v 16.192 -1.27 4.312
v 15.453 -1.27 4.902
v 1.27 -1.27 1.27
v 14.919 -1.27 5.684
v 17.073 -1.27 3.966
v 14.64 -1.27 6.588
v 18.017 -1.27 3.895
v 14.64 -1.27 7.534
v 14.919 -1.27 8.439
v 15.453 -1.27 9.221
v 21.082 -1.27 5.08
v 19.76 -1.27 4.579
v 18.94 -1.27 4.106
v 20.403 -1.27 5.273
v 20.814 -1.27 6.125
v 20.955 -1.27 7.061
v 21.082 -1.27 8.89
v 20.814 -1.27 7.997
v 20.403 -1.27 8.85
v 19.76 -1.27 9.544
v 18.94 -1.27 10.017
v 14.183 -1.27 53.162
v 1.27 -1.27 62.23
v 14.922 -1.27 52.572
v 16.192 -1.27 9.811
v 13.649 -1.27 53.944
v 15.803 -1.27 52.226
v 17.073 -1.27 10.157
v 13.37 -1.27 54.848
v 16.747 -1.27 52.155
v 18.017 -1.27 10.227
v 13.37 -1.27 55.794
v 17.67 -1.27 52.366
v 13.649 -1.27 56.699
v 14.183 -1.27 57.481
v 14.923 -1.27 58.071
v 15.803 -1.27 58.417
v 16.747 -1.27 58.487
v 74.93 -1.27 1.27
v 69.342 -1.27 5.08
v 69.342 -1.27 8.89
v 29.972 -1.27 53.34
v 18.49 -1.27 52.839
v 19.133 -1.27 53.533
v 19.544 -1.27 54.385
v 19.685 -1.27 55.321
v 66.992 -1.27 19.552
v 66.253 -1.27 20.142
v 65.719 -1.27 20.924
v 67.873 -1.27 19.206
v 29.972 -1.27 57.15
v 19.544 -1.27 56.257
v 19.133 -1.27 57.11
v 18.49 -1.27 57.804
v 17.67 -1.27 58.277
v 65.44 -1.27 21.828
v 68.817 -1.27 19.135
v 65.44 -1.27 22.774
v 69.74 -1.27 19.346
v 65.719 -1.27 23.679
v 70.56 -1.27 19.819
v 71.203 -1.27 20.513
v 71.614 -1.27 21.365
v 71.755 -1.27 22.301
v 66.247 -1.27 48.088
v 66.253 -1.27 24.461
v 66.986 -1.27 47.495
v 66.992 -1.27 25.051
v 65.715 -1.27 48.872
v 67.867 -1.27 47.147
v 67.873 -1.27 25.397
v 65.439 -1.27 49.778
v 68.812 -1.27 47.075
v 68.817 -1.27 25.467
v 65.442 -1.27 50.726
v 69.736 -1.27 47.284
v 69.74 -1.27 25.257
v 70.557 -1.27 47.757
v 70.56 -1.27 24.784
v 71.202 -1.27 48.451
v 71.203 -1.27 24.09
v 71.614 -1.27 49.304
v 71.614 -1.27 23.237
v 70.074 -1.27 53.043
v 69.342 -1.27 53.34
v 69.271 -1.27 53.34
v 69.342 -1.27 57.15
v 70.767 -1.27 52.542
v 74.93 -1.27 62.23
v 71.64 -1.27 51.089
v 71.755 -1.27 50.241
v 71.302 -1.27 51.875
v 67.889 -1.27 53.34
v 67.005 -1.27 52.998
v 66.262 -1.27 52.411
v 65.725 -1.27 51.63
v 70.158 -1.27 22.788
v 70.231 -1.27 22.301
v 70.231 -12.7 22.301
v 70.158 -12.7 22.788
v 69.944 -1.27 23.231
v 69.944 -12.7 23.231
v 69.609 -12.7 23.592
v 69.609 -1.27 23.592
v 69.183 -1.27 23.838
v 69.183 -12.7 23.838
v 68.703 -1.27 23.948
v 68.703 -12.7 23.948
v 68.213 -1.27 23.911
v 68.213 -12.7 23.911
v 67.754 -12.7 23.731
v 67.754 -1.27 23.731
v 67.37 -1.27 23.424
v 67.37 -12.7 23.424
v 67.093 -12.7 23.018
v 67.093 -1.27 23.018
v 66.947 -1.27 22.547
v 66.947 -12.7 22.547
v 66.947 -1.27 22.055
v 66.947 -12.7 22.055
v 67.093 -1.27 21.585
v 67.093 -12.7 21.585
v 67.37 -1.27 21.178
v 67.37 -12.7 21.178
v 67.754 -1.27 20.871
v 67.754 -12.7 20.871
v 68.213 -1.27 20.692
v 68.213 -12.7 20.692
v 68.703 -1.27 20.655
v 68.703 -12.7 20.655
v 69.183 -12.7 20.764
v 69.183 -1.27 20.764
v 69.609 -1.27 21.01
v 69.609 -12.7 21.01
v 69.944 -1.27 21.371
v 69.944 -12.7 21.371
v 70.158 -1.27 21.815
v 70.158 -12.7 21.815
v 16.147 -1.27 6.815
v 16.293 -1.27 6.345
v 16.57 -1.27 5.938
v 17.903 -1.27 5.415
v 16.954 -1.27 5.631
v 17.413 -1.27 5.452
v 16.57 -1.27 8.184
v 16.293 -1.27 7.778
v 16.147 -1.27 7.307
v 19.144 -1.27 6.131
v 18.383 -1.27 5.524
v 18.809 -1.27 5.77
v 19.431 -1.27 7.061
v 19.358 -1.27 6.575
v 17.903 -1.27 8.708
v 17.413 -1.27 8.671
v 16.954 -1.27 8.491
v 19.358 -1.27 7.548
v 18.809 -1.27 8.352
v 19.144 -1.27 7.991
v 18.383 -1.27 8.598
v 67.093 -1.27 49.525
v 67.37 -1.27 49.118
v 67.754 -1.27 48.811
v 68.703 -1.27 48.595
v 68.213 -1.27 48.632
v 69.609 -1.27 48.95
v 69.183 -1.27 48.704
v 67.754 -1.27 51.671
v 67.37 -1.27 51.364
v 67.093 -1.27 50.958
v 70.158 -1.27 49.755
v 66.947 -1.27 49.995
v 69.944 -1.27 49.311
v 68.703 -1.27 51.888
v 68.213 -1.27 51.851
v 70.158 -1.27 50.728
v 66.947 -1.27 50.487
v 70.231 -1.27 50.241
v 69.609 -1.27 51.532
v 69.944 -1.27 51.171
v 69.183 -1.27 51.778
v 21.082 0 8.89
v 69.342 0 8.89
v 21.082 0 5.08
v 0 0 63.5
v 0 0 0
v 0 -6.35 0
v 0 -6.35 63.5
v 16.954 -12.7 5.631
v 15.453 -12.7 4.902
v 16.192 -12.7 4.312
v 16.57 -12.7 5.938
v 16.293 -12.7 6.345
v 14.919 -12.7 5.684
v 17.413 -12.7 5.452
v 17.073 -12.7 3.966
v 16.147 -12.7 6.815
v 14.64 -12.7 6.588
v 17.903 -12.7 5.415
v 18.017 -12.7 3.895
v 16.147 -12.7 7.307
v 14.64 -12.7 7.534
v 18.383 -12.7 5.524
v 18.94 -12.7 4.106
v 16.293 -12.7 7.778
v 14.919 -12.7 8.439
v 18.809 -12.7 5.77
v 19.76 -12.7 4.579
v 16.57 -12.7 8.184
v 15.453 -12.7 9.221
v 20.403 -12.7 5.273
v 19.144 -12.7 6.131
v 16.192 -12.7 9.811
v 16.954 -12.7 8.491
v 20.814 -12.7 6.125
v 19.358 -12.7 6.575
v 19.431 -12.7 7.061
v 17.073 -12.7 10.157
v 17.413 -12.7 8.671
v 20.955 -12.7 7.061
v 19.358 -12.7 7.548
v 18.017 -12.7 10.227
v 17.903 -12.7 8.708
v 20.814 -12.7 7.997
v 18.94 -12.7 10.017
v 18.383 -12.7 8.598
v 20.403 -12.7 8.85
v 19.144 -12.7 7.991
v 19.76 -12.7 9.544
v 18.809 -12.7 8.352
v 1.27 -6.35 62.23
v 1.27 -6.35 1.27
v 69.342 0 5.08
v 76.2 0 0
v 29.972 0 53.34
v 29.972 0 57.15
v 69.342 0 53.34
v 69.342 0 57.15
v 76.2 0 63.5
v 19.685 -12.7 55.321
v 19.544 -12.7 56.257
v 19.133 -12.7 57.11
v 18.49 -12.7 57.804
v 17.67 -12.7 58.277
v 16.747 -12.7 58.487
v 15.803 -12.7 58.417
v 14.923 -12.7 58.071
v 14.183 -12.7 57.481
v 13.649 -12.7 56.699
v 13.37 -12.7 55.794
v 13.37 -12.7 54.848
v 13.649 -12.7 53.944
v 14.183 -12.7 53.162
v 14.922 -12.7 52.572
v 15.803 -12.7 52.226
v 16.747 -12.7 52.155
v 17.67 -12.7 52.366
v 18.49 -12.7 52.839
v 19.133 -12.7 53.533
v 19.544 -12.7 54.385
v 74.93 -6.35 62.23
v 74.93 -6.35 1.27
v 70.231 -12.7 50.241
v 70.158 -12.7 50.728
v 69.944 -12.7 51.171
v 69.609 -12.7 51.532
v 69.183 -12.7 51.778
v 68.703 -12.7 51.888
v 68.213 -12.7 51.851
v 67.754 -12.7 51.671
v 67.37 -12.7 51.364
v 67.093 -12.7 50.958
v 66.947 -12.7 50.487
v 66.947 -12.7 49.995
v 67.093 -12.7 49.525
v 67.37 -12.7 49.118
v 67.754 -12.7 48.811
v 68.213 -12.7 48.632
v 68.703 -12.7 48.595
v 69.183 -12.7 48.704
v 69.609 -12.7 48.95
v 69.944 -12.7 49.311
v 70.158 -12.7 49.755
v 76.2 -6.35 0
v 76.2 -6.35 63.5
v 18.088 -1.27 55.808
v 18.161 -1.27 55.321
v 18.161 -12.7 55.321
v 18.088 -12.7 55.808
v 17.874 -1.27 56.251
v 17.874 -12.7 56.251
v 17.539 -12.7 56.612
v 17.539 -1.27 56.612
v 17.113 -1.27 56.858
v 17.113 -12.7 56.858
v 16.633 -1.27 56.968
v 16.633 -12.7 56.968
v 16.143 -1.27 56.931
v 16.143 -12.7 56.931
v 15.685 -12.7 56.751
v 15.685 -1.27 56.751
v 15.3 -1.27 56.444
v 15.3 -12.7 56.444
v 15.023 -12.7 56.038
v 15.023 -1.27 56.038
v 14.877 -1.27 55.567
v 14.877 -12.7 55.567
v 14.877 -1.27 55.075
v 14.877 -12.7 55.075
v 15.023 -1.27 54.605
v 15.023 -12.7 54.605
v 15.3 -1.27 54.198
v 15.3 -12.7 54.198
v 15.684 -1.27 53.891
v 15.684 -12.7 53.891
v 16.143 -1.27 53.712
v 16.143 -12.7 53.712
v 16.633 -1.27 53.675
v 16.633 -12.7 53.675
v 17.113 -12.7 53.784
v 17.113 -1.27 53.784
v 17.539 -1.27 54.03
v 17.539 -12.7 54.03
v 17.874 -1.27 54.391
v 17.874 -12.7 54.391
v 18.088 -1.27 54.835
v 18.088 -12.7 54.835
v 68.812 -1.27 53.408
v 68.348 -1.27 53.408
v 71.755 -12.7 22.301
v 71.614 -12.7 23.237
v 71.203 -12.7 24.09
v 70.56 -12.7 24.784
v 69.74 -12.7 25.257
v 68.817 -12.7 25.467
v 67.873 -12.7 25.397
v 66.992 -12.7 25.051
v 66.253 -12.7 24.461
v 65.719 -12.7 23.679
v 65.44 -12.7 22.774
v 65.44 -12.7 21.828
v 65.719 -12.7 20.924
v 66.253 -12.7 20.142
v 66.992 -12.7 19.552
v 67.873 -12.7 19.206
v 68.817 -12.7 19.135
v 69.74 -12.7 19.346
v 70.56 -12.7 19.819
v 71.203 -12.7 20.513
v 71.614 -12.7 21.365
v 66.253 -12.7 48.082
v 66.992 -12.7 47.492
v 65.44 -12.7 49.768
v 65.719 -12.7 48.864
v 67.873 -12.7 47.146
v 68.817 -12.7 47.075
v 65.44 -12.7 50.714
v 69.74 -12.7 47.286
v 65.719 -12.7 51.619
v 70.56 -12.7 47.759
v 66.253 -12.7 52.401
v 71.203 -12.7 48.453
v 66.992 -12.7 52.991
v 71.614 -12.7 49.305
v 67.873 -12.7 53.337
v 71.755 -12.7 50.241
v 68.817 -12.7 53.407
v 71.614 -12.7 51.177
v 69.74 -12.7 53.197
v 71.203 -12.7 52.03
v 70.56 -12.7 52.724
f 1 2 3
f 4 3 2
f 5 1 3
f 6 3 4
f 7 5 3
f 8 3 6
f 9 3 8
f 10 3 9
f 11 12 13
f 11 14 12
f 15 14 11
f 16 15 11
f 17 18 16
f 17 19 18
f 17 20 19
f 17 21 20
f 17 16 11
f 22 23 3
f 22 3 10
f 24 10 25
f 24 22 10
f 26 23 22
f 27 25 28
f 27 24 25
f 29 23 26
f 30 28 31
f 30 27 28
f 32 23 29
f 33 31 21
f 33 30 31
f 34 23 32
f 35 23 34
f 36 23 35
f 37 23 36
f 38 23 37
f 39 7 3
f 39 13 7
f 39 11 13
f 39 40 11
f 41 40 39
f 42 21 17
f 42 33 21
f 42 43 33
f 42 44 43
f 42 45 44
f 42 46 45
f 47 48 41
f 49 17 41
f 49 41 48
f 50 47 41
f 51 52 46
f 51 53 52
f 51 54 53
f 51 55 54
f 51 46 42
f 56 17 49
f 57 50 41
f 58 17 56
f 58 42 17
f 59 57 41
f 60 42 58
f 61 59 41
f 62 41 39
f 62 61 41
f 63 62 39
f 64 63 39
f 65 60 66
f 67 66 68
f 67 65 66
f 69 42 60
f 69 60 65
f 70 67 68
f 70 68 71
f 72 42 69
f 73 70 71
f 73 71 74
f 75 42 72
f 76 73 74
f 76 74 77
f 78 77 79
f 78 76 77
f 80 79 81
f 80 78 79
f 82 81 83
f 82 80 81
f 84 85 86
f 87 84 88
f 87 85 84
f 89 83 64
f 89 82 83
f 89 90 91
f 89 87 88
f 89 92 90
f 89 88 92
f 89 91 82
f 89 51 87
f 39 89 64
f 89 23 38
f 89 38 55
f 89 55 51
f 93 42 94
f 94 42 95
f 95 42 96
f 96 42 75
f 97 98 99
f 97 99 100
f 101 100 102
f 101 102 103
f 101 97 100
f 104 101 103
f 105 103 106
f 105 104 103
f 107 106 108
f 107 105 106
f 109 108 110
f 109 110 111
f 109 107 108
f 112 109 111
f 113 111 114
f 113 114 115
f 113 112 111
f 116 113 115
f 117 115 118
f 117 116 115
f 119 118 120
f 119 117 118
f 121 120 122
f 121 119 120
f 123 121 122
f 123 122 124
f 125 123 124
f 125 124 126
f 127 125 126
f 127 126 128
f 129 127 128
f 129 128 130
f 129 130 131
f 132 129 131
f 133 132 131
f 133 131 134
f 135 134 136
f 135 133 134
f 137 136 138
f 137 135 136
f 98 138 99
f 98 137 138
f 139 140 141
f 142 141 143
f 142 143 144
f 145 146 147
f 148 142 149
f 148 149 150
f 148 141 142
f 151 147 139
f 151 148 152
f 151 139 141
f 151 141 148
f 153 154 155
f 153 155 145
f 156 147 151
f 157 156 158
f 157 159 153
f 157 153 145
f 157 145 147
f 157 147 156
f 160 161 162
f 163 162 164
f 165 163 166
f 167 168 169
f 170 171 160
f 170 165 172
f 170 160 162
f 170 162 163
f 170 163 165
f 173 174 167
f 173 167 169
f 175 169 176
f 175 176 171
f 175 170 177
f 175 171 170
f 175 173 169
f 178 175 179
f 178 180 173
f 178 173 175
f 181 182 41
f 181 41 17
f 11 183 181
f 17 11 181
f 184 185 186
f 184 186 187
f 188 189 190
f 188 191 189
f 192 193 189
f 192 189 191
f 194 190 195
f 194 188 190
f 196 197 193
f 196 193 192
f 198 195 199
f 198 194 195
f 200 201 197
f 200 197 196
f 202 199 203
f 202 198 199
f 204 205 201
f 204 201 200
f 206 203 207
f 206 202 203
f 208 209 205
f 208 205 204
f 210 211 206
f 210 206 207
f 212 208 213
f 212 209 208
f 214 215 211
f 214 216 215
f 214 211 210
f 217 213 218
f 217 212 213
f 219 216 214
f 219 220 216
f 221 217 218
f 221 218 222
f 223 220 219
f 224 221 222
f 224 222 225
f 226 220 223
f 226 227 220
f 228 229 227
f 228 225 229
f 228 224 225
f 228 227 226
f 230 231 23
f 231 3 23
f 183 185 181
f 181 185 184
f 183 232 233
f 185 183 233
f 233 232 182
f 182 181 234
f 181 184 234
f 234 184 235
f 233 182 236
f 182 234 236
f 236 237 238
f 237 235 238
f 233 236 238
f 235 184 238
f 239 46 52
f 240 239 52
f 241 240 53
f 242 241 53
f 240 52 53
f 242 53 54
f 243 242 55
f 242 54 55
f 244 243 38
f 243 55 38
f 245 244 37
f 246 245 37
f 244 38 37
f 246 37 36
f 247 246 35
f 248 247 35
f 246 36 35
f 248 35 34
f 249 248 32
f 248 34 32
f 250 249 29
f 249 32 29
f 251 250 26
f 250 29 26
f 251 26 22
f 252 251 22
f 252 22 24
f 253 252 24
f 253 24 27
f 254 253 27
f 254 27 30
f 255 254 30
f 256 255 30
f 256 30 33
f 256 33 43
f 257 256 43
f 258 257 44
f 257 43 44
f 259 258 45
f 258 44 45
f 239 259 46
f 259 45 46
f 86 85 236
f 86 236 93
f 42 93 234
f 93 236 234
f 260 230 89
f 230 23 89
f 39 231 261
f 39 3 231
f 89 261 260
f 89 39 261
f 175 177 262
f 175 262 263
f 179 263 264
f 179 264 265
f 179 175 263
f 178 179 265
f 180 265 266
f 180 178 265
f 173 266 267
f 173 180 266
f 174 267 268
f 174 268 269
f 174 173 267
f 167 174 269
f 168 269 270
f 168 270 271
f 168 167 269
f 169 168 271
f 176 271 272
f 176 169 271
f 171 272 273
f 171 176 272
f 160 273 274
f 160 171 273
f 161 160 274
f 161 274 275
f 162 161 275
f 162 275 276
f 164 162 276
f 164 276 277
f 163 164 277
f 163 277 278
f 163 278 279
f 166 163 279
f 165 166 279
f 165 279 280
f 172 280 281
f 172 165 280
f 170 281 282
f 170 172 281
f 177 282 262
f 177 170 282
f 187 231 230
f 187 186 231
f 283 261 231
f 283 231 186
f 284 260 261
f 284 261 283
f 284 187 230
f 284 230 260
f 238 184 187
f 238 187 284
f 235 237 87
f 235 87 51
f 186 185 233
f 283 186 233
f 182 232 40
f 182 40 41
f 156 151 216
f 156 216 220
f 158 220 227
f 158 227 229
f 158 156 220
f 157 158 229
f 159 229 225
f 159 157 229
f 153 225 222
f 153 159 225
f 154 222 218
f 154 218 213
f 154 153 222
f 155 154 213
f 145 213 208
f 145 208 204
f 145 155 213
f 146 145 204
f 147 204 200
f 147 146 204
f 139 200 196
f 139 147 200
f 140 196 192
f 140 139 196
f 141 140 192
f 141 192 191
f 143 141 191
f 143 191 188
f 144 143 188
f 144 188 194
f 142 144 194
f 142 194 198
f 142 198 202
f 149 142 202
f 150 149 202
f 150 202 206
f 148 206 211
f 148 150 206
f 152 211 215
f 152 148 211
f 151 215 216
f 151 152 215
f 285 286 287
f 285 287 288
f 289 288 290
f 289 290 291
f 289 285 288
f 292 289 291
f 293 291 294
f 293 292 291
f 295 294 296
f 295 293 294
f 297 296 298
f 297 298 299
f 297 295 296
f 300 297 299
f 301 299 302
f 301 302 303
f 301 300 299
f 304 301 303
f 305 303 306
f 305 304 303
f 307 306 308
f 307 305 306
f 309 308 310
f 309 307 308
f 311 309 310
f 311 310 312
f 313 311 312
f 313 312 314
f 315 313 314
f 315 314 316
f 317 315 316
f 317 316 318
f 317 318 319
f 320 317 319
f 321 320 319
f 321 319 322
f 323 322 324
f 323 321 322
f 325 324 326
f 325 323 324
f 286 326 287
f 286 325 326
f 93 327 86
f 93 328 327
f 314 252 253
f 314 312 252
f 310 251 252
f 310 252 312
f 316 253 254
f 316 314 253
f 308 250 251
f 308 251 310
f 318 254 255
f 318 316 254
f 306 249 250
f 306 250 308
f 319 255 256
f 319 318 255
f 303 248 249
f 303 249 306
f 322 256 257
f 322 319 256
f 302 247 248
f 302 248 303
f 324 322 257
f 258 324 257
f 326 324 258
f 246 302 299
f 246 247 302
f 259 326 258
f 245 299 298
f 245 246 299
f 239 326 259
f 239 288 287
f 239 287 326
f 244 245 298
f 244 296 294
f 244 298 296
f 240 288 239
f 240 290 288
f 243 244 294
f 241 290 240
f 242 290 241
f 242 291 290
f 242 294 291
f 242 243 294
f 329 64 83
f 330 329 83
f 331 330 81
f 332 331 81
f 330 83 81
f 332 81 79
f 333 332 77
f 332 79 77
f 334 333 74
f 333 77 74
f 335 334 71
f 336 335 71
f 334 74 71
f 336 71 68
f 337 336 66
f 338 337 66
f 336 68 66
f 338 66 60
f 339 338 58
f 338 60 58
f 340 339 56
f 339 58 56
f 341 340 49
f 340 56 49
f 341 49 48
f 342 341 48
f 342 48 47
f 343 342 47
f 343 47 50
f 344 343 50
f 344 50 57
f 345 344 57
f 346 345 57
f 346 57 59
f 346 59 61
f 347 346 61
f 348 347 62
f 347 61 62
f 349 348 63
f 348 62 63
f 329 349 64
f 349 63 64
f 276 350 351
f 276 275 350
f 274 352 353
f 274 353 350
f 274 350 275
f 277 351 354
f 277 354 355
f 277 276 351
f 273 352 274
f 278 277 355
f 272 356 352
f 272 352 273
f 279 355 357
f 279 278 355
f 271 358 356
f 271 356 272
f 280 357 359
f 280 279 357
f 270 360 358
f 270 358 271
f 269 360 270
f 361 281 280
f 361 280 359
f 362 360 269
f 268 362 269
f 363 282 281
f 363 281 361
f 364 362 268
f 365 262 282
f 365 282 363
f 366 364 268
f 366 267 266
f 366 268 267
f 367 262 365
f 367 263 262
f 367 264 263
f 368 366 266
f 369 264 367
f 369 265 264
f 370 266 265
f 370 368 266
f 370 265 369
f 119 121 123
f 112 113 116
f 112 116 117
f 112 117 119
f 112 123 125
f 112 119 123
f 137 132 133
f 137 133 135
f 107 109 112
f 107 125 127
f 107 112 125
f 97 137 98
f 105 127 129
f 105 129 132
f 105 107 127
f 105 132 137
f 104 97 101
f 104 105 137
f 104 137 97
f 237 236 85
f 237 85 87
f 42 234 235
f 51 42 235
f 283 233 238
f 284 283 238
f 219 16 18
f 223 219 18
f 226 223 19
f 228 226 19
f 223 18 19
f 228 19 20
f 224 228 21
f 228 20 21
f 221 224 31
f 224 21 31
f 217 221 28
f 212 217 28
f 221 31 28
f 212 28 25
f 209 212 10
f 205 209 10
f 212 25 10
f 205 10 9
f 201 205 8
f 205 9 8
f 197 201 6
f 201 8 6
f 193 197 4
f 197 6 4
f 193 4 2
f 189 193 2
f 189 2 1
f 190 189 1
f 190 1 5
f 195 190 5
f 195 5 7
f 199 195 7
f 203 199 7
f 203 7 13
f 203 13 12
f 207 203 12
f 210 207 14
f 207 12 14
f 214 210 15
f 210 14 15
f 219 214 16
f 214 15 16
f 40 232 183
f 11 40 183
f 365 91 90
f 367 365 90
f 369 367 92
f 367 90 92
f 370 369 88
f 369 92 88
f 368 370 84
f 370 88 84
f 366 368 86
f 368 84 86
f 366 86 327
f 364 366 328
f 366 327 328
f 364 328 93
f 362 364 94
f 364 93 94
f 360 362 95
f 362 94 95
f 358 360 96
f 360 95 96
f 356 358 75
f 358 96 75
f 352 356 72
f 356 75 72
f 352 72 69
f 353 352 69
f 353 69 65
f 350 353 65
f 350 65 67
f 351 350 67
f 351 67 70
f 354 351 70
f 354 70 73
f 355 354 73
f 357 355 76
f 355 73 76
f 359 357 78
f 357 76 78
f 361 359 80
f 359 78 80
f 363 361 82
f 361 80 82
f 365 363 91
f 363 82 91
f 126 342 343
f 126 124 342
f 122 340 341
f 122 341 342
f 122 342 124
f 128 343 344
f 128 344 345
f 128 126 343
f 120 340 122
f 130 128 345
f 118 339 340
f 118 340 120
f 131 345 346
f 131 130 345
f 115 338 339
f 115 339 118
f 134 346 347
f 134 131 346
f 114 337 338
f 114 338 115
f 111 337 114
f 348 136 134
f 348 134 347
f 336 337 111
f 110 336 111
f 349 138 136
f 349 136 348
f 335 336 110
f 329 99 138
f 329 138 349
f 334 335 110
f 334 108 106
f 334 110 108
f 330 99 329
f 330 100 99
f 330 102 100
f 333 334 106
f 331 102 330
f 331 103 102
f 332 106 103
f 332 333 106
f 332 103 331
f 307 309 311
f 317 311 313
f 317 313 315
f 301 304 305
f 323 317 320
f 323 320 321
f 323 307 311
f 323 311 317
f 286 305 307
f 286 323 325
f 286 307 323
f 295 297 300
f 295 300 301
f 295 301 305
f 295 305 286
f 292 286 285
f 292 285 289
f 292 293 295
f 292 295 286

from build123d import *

# Parameters (mm, degrees)
F0_W     = 76.2
F0_H     = 63.5
F1_DEPTH = 6.35
F2_T     = -1.27
F3_R     = 3.175
F3_R_2   = 1.651
F4_DEPTH = 11.43
F5_W     = 48.26
F5_H     = 3.81
F5_W_2   = 39.37
F6_DEPTH = 1.27


# Not quite as in the source:
# - a feature names something its author has since deleted; it is built from what else it names


with BuildPart() as f1:
    # F0 (on Front) → F1 (new body)
    with BuildSketch(Plane.XZ):
        with Locations((38.1, 31.75)):
            Rectangle(F0_W, F0_H)
    extrude(amount=F1_DEPTH)

    # F2
    f2_openings = [f1.faces().sort_by_distance(p)[0] for p in [
        (38.1, -6.35, 31.75),
    ]]
    offset(amount=F2_T, openings=f2_openings)

    # F3 (on face) → F4 (join)
    with BuildSketch(Plane.XZ.offset(1.27)):
        with Locations((16.51, 55.3212)):
            Circle(F3_R)
        with Locations((16.51, 55.3212)):
            Circle(F3_R_2, mode=Mode.SUBTRACT)
        with Locations((68.58, 50.2412)):
            Circle(F3_R)
        with Locations((68.58, 50.2412)):
            Circle(F3_R_2, mode=Mode.SUBTRACT)
        with Locations((68.58, 22.3012)):
            Circle(F3_R)
        with Locations((68.58, 22.3012)):
            Circle(F3_R_2, mode=Mode.SUBTRACT)
        with Locations((17.78, 7.0612)):
            Circle(F3_R)
        with Locations((17.78, 7.0612)):
            Circle(F3_R_2, mode=Mode.SUBTRACT)
    extrude(amount=F4_DEPTH)

    # F5 (on face) → F6 (cut)
    with BuildSketch(Plane(origin=(0, 0, 0), x_dir=(-1, 0, 0), z_dir=(0, 1, 0))):
        with Locations((-45.212, 6.985)):
            Rectangle(F5_W, F5_H)
        with Locations((-49.657, 55.245)):
            Rectangle(F5_W_2, F5_H)
    extrude(amount=-F6_DEPTH, mode=Mode.SUBTRACT)


solid = f1.part
